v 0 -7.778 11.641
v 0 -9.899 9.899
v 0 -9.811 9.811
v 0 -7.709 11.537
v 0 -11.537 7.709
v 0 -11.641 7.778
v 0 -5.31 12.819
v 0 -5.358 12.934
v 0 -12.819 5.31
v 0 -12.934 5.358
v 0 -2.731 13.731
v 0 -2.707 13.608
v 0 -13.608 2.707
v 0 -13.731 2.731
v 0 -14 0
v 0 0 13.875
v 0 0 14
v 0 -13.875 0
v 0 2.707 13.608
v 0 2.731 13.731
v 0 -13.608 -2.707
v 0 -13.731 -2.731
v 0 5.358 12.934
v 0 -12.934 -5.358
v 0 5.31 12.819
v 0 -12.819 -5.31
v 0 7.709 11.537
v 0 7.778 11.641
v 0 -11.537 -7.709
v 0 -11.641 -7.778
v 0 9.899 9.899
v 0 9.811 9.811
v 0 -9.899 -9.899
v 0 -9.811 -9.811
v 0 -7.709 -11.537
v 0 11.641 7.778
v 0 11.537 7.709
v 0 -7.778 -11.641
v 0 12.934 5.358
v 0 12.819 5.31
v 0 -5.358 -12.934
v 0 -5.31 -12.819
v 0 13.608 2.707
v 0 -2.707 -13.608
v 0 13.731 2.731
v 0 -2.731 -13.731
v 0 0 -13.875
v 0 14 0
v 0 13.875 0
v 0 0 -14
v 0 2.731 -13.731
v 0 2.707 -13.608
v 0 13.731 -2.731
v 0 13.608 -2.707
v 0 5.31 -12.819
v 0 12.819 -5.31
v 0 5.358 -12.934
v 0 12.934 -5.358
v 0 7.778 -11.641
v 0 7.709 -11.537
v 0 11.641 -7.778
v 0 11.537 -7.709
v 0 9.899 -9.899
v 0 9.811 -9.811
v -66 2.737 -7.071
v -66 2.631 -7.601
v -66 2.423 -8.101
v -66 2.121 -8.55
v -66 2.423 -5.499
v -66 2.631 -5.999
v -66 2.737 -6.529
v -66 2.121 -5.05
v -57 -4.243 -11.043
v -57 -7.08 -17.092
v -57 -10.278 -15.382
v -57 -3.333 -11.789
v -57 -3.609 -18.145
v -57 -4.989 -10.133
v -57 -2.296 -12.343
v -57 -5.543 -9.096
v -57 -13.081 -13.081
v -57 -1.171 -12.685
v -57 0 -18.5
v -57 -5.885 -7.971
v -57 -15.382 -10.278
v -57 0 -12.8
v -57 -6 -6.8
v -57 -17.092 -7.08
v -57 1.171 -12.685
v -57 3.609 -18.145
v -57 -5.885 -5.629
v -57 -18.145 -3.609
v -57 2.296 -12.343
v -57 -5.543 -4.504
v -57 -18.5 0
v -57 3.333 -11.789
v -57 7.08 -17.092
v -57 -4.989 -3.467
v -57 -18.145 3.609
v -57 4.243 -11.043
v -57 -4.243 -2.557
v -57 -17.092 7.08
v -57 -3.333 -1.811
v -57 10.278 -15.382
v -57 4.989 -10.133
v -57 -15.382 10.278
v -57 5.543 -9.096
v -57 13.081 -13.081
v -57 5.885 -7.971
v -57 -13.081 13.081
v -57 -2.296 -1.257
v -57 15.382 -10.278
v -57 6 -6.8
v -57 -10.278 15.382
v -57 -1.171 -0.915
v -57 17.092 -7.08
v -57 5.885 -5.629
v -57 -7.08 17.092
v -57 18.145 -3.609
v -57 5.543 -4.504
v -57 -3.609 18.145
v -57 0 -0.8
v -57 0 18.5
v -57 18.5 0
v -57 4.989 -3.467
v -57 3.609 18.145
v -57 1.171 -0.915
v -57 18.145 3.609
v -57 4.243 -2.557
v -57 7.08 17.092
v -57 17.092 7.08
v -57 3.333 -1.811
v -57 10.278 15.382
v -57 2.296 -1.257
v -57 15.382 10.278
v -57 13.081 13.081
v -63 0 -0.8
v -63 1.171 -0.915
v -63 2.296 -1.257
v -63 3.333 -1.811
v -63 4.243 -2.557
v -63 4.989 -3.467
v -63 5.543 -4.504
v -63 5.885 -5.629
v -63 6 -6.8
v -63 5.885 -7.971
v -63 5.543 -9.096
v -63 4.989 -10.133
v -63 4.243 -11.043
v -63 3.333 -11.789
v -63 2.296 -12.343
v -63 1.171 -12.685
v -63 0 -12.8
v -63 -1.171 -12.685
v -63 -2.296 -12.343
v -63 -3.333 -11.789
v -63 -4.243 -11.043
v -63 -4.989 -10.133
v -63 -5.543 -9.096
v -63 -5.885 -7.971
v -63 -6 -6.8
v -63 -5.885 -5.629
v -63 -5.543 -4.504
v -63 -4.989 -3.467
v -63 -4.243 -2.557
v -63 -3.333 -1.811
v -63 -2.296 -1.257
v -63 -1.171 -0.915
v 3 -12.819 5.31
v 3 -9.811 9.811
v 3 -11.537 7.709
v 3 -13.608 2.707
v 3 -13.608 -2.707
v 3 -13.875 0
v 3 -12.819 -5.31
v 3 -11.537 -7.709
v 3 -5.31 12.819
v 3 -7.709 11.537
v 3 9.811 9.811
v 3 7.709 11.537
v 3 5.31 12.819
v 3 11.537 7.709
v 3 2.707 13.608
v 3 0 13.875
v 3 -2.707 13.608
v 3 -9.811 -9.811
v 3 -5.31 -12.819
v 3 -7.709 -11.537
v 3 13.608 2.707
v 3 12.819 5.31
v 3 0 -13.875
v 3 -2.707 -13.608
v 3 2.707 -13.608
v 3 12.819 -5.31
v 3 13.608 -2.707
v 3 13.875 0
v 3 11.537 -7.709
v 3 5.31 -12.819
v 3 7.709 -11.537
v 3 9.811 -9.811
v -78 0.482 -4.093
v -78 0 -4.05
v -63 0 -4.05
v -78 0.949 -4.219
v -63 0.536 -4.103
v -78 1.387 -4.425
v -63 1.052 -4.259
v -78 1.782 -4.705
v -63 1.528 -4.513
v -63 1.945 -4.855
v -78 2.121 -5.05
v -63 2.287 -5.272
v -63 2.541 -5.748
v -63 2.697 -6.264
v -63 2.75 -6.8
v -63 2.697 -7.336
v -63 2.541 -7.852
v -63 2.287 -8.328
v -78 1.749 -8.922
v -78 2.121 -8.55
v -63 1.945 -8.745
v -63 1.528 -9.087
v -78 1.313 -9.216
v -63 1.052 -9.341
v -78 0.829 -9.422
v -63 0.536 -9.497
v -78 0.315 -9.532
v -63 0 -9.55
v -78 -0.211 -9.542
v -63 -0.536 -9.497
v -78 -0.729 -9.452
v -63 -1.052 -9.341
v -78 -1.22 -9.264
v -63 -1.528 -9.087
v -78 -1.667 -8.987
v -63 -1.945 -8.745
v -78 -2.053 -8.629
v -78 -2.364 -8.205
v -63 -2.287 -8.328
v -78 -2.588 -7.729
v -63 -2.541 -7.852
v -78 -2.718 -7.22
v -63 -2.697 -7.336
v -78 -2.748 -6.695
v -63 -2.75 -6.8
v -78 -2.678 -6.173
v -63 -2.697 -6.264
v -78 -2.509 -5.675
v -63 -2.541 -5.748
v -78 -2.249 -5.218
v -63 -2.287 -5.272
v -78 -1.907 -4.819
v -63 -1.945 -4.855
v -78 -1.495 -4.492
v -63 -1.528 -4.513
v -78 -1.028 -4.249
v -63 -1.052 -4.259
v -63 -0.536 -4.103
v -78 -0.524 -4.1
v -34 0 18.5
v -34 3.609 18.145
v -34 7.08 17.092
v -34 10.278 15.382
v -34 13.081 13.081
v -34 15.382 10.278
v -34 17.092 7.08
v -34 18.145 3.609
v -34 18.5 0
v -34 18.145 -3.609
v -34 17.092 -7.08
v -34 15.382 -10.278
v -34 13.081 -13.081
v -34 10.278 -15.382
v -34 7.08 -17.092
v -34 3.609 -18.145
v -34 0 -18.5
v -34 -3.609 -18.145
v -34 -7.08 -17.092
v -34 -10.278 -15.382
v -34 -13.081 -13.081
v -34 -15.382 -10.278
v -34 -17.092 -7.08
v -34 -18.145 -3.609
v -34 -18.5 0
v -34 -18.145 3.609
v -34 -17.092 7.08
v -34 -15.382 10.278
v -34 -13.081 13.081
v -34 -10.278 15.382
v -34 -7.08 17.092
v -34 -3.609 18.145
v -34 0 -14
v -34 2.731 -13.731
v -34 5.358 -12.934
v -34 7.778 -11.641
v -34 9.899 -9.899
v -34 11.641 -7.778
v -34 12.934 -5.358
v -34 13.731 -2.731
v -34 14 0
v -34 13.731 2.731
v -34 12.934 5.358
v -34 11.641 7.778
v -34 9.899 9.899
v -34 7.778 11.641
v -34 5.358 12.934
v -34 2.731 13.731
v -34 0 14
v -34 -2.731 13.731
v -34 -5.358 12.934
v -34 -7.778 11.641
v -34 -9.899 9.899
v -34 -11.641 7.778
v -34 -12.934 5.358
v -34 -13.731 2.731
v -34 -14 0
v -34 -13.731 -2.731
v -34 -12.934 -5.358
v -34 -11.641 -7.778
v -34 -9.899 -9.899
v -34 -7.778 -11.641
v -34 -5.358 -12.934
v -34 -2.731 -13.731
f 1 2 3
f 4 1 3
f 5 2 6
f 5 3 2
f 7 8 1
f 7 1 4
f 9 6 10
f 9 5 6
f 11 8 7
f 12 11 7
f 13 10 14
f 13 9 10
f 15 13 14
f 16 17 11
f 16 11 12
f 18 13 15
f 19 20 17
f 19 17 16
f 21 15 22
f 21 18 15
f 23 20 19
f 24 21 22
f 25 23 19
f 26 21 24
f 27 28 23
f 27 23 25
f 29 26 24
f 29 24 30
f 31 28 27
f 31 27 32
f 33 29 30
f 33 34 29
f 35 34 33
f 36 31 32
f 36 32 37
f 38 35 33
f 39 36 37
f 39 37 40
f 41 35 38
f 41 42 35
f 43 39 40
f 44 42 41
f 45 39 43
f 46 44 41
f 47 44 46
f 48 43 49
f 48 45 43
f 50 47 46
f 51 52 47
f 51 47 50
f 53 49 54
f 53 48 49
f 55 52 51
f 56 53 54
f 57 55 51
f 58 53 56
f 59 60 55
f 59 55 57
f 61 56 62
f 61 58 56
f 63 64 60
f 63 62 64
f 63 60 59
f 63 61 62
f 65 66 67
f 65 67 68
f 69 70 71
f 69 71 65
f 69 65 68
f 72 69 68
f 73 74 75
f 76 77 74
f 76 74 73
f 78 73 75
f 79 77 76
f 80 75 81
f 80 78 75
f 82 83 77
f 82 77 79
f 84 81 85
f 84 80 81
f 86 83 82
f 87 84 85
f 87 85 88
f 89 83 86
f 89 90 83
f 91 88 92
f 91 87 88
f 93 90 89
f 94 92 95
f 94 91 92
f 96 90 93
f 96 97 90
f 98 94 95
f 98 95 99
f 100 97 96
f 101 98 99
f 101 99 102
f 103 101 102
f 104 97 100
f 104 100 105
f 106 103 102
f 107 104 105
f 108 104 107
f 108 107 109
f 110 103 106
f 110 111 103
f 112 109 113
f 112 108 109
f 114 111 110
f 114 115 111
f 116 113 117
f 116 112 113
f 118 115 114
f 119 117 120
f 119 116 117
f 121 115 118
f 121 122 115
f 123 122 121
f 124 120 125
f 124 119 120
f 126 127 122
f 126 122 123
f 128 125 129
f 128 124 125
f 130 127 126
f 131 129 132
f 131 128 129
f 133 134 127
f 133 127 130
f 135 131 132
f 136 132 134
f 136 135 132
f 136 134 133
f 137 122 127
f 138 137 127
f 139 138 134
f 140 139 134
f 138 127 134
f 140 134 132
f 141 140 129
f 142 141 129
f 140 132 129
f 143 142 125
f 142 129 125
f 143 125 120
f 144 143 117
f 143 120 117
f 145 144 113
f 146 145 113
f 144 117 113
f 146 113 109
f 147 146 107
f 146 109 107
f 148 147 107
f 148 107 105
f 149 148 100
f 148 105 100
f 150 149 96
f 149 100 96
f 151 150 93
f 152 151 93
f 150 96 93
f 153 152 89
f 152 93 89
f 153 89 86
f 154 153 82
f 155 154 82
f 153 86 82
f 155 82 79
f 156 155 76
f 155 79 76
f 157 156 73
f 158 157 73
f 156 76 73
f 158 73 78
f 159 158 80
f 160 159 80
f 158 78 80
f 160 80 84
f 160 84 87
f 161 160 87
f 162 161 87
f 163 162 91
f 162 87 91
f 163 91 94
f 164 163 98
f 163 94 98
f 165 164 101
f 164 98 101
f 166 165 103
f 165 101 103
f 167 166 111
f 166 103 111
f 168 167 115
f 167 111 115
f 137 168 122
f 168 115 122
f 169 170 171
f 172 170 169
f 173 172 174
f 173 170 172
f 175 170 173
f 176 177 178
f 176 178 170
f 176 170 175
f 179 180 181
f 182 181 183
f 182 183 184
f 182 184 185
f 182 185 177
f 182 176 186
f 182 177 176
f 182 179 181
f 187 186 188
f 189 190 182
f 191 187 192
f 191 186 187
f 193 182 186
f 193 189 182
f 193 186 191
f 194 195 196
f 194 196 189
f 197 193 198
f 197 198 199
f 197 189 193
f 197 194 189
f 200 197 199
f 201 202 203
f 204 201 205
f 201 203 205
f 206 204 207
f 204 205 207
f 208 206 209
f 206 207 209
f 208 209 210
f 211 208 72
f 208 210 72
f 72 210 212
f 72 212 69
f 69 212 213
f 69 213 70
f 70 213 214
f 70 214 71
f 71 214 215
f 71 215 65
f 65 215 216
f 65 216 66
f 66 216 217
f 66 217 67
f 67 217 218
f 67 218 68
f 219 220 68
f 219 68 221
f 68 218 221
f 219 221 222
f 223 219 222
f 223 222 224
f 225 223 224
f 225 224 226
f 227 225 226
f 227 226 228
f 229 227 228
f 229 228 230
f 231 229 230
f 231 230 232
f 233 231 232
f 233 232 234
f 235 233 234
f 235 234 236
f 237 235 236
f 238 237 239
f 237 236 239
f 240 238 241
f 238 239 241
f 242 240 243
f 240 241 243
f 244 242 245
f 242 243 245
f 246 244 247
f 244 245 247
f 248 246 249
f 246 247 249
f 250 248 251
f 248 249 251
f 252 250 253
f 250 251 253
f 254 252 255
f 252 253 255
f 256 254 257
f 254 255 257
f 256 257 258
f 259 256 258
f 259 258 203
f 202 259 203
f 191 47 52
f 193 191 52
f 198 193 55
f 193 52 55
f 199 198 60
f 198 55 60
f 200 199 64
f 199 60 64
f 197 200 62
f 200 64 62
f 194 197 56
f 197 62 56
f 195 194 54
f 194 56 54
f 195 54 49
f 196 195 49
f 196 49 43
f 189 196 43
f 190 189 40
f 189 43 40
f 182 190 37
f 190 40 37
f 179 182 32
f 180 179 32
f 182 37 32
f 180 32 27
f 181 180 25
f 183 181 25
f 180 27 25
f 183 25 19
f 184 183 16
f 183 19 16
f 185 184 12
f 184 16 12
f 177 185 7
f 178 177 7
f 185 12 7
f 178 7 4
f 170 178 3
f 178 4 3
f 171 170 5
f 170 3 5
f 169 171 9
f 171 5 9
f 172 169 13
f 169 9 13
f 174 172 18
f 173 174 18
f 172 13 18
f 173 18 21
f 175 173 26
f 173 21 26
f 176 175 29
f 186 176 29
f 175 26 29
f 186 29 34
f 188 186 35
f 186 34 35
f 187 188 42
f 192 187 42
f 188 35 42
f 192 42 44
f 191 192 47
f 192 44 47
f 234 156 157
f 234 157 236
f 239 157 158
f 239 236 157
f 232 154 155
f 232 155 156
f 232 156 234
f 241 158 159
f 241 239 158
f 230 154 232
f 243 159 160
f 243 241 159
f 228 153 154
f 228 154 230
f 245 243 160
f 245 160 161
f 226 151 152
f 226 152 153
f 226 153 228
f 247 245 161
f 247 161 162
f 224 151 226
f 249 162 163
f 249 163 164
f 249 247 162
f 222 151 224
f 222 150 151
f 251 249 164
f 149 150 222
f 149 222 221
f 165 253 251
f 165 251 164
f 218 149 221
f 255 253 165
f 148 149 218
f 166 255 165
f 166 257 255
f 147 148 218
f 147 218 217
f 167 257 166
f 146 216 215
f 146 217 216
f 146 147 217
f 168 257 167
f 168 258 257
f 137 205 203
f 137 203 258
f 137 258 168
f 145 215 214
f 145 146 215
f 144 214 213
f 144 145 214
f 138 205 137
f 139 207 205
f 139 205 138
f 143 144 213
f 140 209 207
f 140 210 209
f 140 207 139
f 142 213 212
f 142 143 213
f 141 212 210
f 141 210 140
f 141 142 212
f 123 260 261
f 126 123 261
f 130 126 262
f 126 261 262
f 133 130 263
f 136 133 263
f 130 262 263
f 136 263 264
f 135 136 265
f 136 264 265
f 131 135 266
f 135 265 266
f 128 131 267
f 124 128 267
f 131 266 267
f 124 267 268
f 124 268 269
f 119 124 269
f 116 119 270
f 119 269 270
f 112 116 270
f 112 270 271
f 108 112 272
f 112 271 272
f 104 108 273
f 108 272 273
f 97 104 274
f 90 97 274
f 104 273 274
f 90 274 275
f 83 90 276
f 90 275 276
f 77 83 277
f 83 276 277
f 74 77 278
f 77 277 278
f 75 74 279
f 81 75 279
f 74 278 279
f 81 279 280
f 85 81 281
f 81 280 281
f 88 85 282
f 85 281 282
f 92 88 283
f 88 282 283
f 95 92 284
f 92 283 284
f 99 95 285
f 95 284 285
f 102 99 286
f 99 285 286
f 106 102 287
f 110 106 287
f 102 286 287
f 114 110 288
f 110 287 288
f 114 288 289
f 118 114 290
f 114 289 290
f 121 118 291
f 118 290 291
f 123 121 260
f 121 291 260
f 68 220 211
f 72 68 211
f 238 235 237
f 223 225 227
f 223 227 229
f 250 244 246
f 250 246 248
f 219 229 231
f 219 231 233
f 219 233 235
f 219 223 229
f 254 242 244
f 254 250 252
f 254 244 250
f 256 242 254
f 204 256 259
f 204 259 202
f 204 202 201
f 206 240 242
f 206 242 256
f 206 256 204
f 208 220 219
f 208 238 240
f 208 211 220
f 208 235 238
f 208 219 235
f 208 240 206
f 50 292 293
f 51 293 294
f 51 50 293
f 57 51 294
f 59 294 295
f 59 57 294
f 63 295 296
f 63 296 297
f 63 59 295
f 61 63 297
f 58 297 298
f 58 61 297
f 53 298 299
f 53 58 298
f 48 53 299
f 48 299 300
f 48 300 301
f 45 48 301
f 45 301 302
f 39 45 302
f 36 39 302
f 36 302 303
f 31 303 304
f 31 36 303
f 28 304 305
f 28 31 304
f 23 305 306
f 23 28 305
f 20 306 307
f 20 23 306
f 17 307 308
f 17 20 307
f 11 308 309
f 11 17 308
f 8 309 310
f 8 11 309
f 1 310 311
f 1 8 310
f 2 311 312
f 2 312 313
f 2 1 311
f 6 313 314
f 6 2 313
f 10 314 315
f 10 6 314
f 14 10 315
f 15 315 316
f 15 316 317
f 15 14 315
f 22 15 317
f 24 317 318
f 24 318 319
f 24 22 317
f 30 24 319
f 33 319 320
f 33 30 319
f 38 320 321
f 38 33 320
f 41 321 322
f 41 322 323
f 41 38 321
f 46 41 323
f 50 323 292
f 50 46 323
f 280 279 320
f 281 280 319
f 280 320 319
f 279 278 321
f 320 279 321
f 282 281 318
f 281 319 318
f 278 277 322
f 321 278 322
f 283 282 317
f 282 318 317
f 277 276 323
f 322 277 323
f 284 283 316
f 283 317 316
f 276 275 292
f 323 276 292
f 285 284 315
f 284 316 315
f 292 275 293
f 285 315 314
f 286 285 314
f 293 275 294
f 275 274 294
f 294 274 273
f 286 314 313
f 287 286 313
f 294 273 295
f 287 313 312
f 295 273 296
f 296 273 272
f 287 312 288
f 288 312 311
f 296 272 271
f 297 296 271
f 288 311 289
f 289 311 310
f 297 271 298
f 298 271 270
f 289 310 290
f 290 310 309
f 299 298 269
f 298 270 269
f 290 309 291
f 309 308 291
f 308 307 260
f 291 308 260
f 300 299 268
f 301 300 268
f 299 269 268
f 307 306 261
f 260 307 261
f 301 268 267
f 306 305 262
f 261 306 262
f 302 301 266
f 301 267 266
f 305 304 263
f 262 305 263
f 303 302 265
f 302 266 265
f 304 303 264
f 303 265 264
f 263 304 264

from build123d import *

# Parameters (mm, degrees)
SKETCH1_R           = 14
BOSS_EXTRUDE1_DEPTH = 34
SKETCH2_R           = 18.5
BOSS_EXTRUDE2_DEPTH = 23
SKETCH3_R           = 6
BOSS_EXTRUDE3_DEPTH = 6
SKETCH5_R           = 2.75
BOSS_EXTRUDE4_DEPTH = 15
CUT_EXTRUDE1_DEPTH  = 12
SKETCH7_R           = 13.875
BOSS_EXTRUDE5_DEPTH = 3


with BuildPart() as part:
    # Sketch1 → Boss-Extrude1 (new body)
    with BuildSketch(Plane(origin=(0, 0, 0), x_dir=(0, 0, -1), z_dir=(1, 0, 0))):
        Circle(SKETCH1_R)
    extrude(amount=-BOSS_EXTRUDE1_DEPTH)

    # Sketch2 → Boss-Extrude2 (add)
    with BuildSketch(Plane.ZY.offset(34)):
        Circle(SKETCH2_R)
    extrude(amount=BOSS_EXTRUDE2_DEPTH)

    # Sketch3 → Boss-Extrude3 (add)
    with BuildSketch(Plane.ZY.offset(57)):
        with Locations((-6.8, 0)):
            Circle(SKETCH3_R)
    extrude(amount=BOSS_EXTRUDE3_DEPTH)

    # Sketch5 → Boss-Extrude4 (add)
    with BuildSketch(Plane.ZY.offset(63)):
        with Locations((-6.8, 0)):
            Circle(SKETCH5_R)
    extrude(amount=BOSS_EXTRUDE4_DEPTH)

    # Sketch6 → Cut-Extrude1 (cut)
    with BuildSketch(Plane.ZY.offset(78)):
        with BuildLine():
            Line((-8.55, 2.121320344), (-5.05, 2.121320344))
            ThreePointArc((-5.05, 2.121320344), (-6.8, 2.75), (-8.55, 2.121320344))
        make_face()
    extrude(amount=-CUT_EXTRUDE1_DEPTH, mode=Mode.SUBTRACT)

    # Sketch7 → Boss-Extrude5 (add)
    with BuildSketch(Plane(origin=(0, 0, 0), x_dir=(0, 0, -1), z_dir=(1, 0, 0))):
        Circle(SKETCH7_R)
    extrude(amount=BOSS_EXTRUDE5_DEPTH)


solid = part.part
